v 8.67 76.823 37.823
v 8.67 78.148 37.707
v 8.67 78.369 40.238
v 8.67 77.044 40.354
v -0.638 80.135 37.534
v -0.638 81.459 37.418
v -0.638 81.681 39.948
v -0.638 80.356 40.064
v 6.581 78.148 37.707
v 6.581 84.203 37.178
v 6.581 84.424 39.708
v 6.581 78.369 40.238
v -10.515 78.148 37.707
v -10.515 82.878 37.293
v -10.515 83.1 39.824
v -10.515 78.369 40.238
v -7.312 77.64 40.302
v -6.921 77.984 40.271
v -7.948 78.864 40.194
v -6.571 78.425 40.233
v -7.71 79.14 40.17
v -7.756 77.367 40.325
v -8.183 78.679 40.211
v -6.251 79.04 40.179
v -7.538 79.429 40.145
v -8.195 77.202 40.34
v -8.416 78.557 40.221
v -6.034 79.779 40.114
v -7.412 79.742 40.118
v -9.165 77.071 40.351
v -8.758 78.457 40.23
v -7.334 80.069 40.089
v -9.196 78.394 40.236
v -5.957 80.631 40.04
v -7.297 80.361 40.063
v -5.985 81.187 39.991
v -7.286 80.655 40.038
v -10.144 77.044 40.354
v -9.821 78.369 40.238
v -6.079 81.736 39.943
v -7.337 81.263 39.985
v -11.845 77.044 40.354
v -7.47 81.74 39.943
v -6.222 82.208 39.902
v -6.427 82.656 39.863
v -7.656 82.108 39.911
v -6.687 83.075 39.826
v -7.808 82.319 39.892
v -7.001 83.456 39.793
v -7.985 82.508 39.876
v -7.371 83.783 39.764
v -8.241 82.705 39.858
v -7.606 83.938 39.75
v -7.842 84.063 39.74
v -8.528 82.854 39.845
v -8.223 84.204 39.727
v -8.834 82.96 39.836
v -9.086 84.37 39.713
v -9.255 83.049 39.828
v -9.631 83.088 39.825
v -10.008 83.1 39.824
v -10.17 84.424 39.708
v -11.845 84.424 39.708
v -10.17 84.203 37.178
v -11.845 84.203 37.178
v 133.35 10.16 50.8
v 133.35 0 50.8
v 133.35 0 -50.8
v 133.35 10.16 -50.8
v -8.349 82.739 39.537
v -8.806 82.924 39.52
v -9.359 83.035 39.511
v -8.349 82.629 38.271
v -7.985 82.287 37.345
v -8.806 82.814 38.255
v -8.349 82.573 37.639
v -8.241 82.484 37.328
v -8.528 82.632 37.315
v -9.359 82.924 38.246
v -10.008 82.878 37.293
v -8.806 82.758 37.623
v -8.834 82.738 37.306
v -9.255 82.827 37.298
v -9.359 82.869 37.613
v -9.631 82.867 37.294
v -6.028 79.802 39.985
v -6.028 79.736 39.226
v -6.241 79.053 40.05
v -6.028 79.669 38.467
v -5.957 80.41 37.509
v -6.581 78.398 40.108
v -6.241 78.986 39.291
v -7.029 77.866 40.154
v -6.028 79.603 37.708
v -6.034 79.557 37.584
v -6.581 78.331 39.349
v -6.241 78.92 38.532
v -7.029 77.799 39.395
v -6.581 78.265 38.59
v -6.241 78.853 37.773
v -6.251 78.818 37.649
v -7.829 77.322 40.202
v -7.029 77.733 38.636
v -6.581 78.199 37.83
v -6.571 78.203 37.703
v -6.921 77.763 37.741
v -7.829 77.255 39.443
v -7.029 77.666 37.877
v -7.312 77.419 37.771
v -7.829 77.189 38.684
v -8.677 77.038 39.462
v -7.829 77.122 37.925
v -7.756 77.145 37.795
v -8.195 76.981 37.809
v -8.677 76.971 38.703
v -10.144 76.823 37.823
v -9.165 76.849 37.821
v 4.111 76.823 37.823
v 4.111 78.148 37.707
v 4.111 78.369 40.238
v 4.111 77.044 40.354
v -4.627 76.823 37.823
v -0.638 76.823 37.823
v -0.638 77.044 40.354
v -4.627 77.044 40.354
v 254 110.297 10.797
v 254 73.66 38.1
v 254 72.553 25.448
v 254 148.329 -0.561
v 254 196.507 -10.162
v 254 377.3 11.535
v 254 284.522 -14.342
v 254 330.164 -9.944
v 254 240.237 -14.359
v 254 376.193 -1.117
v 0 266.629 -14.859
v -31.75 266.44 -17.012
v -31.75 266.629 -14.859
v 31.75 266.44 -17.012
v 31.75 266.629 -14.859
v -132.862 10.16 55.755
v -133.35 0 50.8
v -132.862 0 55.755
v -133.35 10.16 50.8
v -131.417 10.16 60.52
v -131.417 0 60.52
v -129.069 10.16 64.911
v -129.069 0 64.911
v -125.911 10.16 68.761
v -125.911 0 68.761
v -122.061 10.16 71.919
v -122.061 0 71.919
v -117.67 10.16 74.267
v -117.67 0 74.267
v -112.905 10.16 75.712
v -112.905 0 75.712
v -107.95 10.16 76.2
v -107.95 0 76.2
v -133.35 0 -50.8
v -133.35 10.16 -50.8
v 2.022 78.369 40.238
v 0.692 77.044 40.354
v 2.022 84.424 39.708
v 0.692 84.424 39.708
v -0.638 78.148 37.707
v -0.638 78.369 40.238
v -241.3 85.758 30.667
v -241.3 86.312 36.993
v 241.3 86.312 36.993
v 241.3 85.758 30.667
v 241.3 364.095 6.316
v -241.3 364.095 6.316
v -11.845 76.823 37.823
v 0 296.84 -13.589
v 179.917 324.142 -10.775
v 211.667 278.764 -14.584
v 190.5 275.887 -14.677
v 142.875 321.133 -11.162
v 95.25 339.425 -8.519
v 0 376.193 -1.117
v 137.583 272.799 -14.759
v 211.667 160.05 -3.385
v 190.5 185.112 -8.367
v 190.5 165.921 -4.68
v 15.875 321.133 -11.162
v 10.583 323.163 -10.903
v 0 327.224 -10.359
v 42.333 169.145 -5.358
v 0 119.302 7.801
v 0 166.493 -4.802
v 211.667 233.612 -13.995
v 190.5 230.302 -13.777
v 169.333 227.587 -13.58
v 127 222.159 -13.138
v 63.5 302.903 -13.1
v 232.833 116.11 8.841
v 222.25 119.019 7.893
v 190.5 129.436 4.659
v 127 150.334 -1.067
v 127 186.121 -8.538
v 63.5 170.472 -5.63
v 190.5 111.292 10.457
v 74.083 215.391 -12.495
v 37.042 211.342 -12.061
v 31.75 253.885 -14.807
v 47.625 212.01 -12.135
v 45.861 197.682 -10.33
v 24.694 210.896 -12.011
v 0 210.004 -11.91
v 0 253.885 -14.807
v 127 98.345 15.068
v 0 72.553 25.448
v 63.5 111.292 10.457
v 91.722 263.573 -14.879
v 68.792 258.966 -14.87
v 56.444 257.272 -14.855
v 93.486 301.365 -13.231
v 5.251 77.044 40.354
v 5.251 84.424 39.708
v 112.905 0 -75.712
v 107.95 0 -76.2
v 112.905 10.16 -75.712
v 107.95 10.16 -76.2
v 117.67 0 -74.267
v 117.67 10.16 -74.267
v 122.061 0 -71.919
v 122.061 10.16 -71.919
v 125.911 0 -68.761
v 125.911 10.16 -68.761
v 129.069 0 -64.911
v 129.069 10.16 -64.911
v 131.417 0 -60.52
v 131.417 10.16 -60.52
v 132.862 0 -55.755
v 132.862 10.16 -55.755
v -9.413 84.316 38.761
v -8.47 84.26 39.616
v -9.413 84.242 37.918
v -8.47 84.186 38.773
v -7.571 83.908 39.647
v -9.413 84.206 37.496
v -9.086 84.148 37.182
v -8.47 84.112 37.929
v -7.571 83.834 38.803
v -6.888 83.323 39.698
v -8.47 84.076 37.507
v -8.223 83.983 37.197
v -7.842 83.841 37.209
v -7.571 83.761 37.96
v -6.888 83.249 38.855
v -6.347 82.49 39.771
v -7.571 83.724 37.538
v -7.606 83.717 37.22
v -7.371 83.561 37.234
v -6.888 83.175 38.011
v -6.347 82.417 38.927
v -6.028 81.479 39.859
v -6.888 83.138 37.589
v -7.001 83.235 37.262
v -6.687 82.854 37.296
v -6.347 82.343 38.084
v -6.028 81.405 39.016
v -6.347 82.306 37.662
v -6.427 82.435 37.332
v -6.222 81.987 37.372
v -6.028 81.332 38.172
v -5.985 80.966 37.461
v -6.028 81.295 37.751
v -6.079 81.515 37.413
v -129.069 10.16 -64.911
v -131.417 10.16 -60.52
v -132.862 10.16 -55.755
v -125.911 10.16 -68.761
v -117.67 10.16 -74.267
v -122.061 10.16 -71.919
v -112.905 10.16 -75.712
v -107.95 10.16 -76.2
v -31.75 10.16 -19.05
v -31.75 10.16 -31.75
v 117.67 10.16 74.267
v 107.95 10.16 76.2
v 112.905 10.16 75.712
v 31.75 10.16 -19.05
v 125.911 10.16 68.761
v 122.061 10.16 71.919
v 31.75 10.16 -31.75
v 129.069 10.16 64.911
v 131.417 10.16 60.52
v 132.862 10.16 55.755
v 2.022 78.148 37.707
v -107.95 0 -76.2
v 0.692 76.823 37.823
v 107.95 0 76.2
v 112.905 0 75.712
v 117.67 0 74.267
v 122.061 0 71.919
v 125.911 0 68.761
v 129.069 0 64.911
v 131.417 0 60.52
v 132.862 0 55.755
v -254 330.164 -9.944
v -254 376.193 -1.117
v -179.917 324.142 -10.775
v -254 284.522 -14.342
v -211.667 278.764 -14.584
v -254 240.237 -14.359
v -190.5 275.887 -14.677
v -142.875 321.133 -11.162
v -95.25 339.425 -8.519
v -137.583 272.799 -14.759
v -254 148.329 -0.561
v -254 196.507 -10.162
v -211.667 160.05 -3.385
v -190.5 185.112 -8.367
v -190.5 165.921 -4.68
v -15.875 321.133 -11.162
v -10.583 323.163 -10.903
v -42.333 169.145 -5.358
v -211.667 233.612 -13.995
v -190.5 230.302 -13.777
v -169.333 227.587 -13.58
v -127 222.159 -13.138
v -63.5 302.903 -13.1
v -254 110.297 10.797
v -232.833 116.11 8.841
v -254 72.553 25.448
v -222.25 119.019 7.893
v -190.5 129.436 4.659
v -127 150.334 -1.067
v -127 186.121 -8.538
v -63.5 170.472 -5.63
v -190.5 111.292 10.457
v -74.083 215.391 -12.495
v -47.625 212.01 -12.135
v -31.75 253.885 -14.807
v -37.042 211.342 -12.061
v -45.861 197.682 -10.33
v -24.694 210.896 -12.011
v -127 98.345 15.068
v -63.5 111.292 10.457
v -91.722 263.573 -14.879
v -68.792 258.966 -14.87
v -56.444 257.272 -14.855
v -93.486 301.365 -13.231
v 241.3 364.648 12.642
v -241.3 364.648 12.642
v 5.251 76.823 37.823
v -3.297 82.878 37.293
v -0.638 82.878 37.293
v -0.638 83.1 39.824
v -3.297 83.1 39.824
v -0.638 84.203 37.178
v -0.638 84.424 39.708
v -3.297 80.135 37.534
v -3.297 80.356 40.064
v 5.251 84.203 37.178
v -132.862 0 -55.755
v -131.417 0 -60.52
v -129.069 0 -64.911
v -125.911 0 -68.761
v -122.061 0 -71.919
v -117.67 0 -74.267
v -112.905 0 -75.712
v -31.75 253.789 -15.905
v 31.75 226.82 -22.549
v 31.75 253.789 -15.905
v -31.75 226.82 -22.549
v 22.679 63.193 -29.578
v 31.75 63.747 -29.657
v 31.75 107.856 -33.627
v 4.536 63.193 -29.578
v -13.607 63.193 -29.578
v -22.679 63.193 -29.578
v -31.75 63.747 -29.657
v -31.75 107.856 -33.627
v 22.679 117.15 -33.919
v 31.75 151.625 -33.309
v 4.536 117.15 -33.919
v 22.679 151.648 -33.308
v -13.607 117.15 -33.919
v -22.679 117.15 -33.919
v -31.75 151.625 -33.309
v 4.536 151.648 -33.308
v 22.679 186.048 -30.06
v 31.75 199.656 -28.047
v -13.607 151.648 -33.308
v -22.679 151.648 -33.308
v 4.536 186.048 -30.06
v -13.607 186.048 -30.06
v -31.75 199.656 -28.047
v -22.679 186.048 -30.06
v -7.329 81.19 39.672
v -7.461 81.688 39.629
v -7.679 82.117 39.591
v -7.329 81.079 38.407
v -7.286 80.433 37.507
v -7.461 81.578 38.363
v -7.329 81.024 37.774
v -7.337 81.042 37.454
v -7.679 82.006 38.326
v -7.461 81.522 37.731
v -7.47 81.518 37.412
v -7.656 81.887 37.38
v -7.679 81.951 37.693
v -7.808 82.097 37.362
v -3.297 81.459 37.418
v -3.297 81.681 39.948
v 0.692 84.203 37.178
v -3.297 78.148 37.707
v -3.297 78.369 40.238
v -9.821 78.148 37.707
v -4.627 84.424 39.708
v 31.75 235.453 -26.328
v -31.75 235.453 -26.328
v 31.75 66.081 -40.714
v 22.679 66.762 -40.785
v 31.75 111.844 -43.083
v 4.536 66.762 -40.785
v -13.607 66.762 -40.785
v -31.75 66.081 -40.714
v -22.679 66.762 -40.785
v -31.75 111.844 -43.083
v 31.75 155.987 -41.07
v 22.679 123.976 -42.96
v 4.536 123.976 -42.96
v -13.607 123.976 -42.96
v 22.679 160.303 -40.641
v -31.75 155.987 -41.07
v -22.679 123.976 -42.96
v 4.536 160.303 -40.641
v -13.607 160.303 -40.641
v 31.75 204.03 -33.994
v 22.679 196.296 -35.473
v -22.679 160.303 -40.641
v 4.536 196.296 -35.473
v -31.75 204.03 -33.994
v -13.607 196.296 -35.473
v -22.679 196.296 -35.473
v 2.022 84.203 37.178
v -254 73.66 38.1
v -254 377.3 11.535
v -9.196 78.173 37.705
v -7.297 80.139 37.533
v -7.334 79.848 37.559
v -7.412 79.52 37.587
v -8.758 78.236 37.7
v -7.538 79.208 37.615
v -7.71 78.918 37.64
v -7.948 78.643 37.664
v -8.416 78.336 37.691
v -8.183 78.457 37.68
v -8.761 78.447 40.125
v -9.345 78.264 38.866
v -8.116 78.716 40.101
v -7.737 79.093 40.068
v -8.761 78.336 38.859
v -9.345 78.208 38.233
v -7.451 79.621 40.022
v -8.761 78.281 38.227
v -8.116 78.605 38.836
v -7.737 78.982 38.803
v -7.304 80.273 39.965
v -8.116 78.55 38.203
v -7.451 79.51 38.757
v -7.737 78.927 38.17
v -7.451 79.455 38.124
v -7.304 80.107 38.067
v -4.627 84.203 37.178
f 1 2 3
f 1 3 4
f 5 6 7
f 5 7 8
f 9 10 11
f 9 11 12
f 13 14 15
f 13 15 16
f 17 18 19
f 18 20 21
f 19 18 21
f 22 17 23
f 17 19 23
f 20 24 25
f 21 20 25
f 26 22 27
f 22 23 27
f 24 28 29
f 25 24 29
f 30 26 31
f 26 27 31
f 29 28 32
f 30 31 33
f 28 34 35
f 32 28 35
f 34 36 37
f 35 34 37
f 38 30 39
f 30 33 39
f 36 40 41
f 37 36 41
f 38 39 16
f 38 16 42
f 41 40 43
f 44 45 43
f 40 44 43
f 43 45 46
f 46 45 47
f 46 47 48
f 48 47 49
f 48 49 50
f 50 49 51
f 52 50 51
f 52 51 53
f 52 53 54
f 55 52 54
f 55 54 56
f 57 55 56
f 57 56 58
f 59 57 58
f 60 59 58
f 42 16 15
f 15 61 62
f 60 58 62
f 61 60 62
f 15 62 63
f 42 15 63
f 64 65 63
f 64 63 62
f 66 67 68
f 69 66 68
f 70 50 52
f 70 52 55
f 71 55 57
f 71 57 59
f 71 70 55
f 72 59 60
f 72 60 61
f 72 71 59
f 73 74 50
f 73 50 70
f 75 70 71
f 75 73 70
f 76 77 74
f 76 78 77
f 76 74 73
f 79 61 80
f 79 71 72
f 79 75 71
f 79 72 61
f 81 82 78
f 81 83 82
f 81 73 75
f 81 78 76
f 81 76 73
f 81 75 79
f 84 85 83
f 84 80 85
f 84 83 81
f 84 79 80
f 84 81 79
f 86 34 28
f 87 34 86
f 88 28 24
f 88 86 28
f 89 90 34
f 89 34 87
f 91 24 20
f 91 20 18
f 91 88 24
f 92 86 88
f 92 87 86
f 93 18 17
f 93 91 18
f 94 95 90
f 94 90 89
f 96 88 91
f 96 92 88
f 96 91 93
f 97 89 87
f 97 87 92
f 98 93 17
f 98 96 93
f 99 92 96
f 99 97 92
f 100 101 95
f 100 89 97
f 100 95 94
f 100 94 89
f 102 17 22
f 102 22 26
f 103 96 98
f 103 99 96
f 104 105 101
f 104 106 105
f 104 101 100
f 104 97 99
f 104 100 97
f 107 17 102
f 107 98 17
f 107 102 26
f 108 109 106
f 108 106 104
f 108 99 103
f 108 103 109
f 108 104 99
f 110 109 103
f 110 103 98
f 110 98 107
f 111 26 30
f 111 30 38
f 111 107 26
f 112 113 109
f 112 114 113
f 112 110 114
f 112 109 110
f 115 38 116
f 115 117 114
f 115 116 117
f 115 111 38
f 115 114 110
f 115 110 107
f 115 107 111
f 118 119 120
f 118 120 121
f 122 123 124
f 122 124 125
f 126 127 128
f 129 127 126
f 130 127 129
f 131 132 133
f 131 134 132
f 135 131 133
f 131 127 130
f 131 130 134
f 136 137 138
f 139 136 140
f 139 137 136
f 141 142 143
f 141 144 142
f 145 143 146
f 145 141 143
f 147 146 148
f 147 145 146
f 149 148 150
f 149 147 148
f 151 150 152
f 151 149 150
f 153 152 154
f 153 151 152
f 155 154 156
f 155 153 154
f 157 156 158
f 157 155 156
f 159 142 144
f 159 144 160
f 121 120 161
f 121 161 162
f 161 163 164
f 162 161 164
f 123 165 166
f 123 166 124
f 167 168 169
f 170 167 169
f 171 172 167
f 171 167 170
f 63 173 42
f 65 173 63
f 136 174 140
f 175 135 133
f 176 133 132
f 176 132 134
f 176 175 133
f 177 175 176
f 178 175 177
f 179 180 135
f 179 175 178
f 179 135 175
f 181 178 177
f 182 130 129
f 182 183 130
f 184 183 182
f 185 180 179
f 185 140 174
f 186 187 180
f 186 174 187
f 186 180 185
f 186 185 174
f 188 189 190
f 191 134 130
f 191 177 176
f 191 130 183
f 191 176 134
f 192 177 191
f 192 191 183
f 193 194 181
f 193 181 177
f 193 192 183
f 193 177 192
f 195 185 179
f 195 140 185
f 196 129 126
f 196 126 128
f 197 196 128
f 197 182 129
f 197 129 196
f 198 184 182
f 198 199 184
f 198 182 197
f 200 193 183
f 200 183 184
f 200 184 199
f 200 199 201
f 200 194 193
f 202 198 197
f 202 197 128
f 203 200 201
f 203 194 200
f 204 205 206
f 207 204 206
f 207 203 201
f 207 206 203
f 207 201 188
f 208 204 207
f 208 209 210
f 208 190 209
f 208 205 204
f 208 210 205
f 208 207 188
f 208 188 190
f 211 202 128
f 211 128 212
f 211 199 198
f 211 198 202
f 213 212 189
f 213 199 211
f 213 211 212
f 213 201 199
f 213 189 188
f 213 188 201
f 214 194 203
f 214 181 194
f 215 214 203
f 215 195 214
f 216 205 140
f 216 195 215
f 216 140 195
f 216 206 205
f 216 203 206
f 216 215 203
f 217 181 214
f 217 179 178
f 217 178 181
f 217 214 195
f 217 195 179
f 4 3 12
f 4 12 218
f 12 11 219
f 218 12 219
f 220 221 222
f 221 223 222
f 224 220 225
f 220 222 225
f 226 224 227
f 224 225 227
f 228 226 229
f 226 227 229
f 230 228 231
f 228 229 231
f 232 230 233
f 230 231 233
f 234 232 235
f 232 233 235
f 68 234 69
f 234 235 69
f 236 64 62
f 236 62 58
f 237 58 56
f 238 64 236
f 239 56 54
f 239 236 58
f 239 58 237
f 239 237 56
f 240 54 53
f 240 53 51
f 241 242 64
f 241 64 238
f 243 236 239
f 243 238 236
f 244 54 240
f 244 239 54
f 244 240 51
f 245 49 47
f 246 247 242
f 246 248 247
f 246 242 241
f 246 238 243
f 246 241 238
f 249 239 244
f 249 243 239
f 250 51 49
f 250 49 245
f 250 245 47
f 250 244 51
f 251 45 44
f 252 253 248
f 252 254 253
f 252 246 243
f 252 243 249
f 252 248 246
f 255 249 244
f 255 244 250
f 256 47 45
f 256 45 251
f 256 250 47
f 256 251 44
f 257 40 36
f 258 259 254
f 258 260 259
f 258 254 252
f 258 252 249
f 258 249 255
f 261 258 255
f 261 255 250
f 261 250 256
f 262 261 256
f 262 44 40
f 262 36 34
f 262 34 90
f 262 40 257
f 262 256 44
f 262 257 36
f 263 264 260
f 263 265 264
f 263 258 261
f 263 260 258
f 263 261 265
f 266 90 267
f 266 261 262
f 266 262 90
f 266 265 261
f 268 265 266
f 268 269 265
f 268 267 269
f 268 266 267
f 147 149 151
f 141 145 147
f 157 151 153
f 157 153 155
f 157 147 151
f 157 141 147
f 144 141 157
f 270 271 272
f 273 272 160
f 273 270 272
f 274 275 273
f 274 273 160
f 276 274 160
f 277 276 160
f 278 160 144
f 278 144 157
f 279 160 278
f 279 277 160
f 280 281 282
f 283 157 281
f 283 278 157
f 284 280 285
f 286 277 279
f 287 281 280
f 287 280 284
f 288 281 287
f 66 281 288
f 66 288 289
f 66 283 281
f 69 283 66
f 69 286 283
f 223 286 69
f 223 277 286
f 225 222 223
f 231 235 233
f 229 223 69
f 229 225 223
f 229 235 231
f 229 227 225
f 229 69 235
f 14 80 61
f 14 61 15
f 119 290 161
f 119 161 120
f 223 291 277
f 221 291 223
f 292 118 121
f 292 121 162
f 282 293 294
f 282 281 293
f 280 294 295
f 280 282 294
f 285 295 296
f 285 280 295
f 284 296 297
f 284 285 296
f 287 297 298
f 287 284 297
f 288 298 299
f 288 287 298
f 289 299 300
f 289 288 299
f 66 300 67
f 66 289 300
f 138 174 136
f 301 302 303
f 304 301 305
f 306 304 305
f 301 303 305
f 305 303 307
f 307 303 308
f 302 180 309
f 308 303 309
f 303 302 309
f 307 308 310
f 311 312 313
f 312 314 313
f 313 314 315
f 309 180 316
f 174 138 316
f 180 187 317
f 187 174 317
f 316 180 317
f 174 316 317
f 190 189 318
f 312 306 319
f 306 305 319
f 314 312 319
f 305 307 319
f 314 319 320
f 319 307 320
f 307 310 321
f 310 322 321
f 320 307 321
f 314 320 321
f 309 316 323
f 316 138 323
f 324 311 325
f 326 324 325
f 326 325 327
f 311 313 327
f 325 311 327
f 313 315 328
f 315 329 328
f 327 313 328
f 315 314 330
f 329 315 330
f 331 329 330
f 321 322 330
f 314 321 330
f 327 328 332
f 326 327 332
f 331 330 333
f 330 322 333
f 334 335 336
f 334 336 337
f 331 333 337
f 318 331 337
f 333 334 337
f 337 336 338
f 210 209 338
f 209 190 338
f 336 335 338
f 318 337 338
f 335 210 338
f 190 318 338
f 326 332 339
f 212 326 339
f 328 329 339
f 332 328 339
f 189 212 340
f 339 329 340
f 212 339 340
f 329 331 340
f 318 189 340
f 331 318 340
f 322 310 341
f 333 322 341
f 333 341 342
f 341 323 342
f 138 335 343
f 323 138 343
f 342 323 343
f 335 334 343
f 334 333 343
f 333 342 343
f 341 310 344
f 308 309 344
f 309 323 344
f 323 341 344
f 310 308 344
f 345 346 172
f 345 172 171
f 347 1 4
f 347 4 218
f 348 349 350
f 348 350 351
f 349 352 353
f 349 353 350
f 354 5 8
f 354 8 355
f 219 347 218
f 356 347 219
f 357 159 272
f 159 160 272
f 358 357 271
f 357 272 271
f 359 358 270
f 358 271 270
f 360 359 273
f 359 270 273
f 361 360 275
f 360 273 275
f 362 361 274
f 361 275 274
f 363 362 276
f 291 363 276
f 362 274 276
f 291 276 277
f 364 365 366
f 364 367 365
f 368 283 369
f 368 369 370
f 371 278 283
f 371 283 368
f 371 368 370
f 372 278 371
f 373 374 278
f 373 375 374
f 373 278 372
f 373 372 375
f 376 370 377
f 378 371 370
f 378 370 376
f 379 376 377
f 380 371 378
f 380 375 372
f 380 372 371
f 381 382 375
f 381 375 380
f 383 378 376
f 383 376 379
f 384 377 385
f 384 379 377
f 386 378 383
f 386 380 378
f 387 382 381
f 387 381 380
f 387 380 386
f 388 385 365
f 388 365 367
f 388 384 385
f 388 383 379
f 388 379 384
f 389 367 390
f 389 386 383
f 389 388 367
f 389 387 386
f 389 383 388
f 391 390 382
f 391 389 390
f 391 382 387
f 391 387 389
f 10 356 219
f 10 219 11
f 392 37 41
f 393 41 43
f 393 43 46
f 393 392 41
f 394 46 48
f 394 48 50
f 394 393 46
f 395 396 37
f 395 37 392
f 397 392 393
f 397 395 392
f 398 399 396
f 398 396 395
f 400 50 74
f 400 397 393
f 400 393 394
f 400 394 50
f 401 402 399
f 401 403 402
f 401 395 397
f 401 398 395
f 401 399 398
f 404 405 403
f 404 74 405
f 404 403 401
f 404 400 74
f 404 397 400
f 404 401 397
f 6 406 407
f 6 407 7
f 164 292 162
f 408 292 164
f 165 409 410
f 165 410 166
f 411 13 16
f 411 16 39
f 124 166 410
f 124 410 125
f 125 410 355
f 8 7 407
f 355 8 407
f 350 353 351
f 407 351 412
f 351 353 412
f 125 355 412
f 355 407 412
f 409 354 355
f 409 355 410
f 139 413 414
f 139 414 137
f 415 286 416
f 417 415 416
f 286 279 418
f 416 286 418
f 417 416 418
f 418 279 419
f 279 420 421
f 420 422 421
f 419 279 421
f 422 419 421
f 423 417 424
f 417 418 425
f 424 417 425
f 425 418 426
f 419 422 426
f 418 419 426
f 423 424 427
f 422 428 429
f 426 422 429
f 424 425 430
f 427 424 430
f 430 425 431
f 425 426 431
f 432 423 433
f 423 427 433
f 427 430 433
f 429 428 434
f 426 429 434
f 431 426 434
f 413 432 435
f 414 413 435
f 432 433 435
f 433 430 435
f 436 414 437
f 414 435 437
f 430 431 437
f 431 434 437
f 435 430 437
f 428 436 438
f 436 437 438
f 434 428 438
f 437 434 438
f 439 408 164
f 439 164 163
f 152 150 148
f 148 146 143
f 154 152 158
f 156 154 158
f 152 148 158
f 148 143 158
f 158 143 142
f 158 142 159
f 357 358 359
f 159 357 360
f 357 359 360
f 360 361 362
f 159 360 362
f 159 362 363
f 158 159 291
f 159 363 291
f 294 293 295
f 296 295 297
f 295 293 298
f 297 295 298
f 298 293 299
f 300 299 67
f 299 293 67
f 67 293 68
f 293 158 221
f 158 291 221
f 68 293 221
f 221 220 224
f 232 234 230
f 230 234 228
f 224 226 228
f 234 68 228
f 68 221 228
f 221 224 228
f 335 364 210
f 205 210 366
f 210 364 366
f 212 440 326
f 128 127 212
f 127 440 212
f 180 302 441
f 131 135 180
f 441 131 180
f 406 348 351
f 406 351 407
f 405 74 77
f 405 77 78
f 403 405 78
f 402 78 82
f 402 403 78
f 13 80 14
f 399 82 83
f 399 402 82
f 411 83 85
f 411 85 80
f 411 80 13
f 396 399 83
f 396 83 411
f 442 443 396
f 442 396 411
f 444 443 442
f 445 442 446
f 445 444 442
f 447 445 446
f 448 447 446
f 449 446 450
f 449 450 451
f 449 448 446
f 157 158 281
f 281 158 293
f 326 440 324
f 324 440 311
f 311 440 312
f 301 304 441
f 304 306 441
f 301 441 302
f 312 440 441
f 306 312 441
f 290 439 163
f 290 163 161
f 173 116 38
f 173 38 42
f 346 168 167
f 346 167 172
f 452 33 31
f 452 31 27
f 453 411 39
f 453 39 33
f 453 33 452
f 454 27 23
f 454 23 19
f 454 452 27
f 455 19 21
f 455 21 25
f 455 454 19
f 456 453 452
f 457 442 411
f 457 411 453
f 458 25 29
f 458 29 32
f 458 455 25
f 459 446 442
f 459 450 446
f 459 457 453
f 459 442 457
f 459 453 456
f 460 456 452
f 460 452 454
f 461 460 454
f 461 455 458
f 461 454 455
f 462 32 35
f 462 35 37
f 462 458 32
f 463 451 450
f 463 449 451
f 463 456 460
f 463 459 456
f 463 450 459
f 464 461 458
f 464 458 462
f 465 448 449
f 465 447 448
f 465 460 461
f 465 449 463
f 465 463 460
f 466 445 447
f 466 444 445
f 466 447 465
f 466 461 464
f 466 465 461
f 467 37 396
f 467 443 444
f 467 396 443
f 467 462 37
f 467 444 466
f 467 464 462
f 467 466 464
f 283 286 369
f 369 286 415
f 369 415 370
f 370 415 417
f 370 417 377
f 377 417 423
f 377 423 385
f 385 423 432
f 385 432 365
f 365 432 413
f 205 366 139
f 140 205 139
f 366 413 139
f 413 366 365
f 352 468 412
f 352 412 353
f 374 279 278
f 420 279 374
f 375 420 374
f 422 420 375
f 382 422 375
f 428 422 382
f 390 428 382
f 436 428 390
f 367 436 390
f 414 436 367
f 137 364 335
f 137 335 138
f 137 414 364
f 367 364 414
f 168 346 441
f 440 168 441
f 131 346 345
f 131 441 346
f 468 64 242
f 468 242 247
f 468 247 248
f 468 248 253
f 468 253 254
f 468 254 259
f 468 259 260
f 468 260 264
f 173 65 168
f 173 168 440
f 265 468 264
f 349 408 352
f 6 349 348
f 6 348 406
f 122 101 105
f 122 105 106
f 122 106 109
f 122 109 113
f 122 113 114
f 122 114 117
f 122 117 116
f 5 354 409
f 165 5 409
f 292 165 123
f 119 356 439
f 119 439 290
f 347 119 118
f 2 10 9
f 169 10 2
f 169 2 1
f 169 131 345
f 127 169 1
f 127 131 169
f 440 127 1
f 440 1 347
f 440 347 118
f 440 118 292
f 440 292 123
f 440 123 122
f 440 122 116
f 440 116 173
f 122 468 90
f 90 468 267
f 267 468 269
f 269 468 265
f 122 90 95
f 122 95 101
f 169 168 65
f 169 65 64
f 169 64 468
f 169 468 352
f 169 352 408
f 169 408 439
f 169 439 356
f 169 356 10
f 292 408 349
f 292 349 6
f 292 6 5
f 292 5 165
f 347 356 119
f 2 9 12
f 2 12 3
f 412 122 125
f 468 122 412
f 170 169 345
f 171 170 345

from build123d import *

# Parameters (mm, degrees)
SKETCH1_W           = 266.7
SKETCH1_H           = 152.4
BOSS_EXTRUDE1_DEPTH = 10.16
BOSS_EXTRUDE3_DEPTH = 254
SKETCH6_W           = 482.6
SKETCH6_H           = 279.4
CUT_EXTRUDE1_DEPTH  = 6.35
LOFT1_START         = -31.75
LOFT1_DEPTH         = 63.5
BOSS_EXTRUDE4_REACH = 463.798
SKETCH7_2_W         = 63.5
SKETCH7_2_H         = 12.7
FILLET4_R           = 25.4
BOSS_EXTRUDE5_DEPTH = 2.54


# Read off the part's stored shape, not the designer's step: Loft1
with BuildPart() as part:
    # Sketch1 → Boss-Extrude1 (new body)
    with BuildSketch(Plane(origin=(0, 0, 0), x_dir=(1, 0, 0), z_dir=(0, 1, 0))):
        Rectangle(SKETCH1_W, SKETCH1_H)
    extrude(amount=BOSS_EXTRUDE1_DEPTH)

    # Loft1 outline → Loft1 (add)
    with BuildSketch(Plane.YZ.offset(LOFT1_START)):
        with BuildLine():
            Line((10.16, -19.05), (10.16, -31.75))
            add(Edge.make_bspline(
                [(10.16, -31.75), (28.965309161, -35.285855321), (52.902221104, -39.786576725), (90.992153833, -42.855395332), (120.526662629, -43.520710588), (158.632305833, -41.305063295), (187.826991891, -37.239656645), (225.166907406, -29.818418758), (248.281057243, -22.646287688), (266.440292521, -17.011625957)],
                knots=[0, 0, 0, 0, 0.219947035, 0.279966299, 0.439970653, 0.559991905, 0.720003625, 0.780025652, 1, 1, 1, 1], degree=3))
            Line((266.440292521, -17.011625957), (253.788619855, -15.904748024))
            add(Edge.make_bspline(
                [(10.16, -19.05), (27.75631541, -23.030622259), (50.154322743, -28.097478842), (85.975275474, -32.459987698), (113.853351235, -34.286596432), (150.017339583, -33.849624359), (177.910203308, -31.332603381), (213.761877453, -26.061191443), (236.17787553, -20.373323721), (253.788619855, -15.904748024)],
                knots=[0, 0, 0, 0, 0.219947035, 0.279966299, 0.439970653, 0.559991905, 0.720003625, 0.780025652, 1, 1, 1, 1], degree=3))
        make_face()
    extrude(amount=LOFT1_DEPTH)


with BuildPart() as body_2:
    # Sketch5 → Boss-Extrude3 (new, symmetric)
    with BuildSketch(Plane(origin=(0, 0, 0), x_dir=(0, 0, -1), z_dir=(1, 0, 0))):
        with BuildLine():
            Line((-38.1, 73.66), (-25.448327334, 72.553122067))
            add(Edge.make_bspline(
                [(1.116743055, 376.193266045), (38.440898524, 219.945682325), (-25.448327334, 72.553122067)],
                knots=[0, 0, 0, 1, 1, 1], degree=2))
            Line((1.116743055, 376.193266045), (-11.534929611, 377.300143978))
            Line((-11.534929611, 377.300143978), (-38.1, 73.66))
        make_face()
    extrude(amount=BOSS_EXTRUDE3_DEPTH, both=True)

    # Sketch6 → Cut-Extrude1 (cut)
    with BuildSketch(Plane(origin=(0, 3.867528241, 44.206050078), x_dir=(1, 0, 0), z_dir=(0, 0.08715574274765818, 0.9961946980917455))):
        with Locations((0, 222.459067663)):
            Rectangle(SKETCH6_W, SKETCH6_H)
    extrude(amount=-CUT_EXTRUDE1_DEPTH, mode=Mode.SUBTRACT)

    # Sketch7<2> → Boss-Extrude4 (add, up to next)
    with BuildSketch(Plane(origin=(0, 0.546894442, 6.251032081), x_dir=(1, 0, 0), z_dir=(0, 0.08715574274765883, 0.9961946980917455)), mode=Mode.PRIVATE) as boss_extrude4_sk1:
        with Locations((0, 260.559067663)):
            Rectangle(SKETCH7_2_W, SKETCH7_2_H)
    boss_extrude4_tool1 = extrude(boss_extrude4_sk1.sketch, amount=BOSS_EXTRUDE4_REACH, mode=Mode.PRIVATE) - body_2.part

    add(part.part)  # Boss-Extrude4 merges part
    add(boss_extrude4_tool1.solids().sort_by_distance((0, 260.114456, -16.458187))[0])

    # Fillet4
    fillet4_edges = [body_2.edges().sort_by_distance(p)[0] for p in [
        (133.35, 5.08, 76.2),
        (133.35, 5.08, -76.2),
        (-133.35, 5.08, -76.2),
        (-133.35, 5.08, 76.2),
    ]]
    fillet(fillet4_edges, radius=FILLET4_R)

    # Sketch9 → Boss-Extrude5 (add)
    # profile 1 of 4: a face of its own
    with BuildSketch(Plane(origin=(0, 3.867528241, 44.206050078), x_dir=(1, 0, 0), z_dir=(0, 0.08715574274765818, 0.9961946980917455))):
        with BuildLine():
            Line((-11.845192308, 80.642400996), (-10.169709869, 80.642400996))
            add(Edge.make_bspline(
                [(-10.169709869, 80.642400996), (-10.039086742, 80.641487896), (-9.786590759, 80.639722862), (-9.420774033, 80.619835181), (-9.080611029, 80.58924934), (-8.76588247, 80.547172972), (-8.477233602, 80.491494415), (-8.215036632, 80.421656578), (-7.978411563, 80.341040413), (-7.76476385, 80.246179137), (-7.569724038, 80.13558031), (-7.384527512, 80.012382096), (-7.2095379, 79.872071384), (-7.042299501, 79.717355048), (-6.884970561, 79.545402599), (-6.73493099, 79.359062194), (-6.595854438, 79.155631639), (-6.46353692, 78.939988558), (-6.343873333, 78.711219076), (-6.23949828, 78.47127043), (-6.152062666, 78.221686781), (-6.081016701, 77.962202136), (-6.024384868, 77.693677905), (-5.984760716, 77.415572233), (-5.96026467, 77.128142598), (-5.957779751, 76.933337422), (-5.956517094, 76.83435145)],
                knots=[0, 0, 0, 0, 1.44355588, 2.790409838, 4.047694926, 5.217575253, 6.298404546, 7.294384826, 8.214239204, 9.058592145, 9.873746385, 10.689560431, 11.514393297, 12.350027578, 13.205127629, 14.088021785, 14.991911688, 15.926770944, 16.882954281, 17.842803888, 18.816321264, 19.80318086, 20.814351908, 21.847355356, 22.906180909, 24, 24, 24, 24], degree=3))
            add(Edge.make_bspline(
                [(-5.956517094, 76.83435145), (-5.959823412, 76.694675801), (-5.966332092, 76.419716111), (-6.021157576, 76.016215932), (-6.109828948, 75.629420767), (-6.23450895, 75.262356277), (-6.389078777, 74.918291224), (-6.573729744, 74.603293052), (-6.785754438, 74.319052512), (-7.022682758, 74.066984889), (-7.279218425, 73.85032935), (-7.545810714, 73.664779736), (-7.825056719, 73.518458383), (-8.071111475, 73.425668764), (-8.284471646, 73.367961649), (-8.471799567, 73.333856188), (-8.684584973, 73.302579424), (-8.924811901, 73.278409413), (-9.191426528, 73.256855703), (-9.485491584, 73.245144256), (-9.80605497, 73.235413782), (-10.028716551, 73.234528126), (-10.14448117, 73.234067663)],
                knots=[0, 0, 0, 0, 1.315458931, 2.589557908, 3.828601765, 5.048913369, 6.235739168, 7.376350998, 8.481830359, 9.569842114, 10.627874879, 11.640079404, 12.624025415, 13.590060155, 14.111227486, 14.704434459, 15.382649715, 16.137166398, 16.978595427, 17.902333227, 18.909396075, 20, 20, 20, 20], degree=3))
            Line((-10.14448117, 73.234067663), (-11.845192308, 73.234067663))
            Line((-11.845192308, 73.234067663), (-11.845192308, 80.642400996))
        make_face()
        with BuildLine():
            Line((-10.515491453, 79.312700141), (-10.515491453, 74.563768517))
            Line((-10.515491453, 74.563768517), (-9.820960203, 74.563768517))
            add(Edge.make_bspline(
                [(-9.820960203, 74.563768517), (-9.738321651, 74.563919946), (-9.579380204, 74.564211192), (-9.349904733, 74.578083516), (-9.137698107, 74.592007503), (-8.943344483, 74.618435698), (-8.765429413, 74.647874846), (-8.606396987, 74.688843453), (-8.462968854, 74.731877503), (-8.336896961, 74.786665183), (-8.221425379, 74.848332363), (-8.114511884, 74.920582613), (-8.011310428, 75.000813792), (-7.913750445, 75.091385611), (-7.821462695, 75.19109873), (-7.734993209, 75.300466927), (-7.65318785, 75.419156515), (-7.578146405, 75.547795036), (-7.509573132, 75.685024038), (-7.448740954, 75.829514259), (-7.398302102, 75.982468991), (-7.356380416, 76.142456392), (-7.326422619, 76.310869336), (-7.301638255, 76.486460411), (-7.288861193, 76.669925294), (-7.287107621, 76.794760931), (-7.286217949, 76.858096108)],
                knots=[0, 0, 0, 0, 1.50275155, 2.890291501, 4.180787663, 5.369391935, 6.45668281, 7.458360028, 8.354766181, 9.177074746, 9.954075863, 10.732690366, 11.5210699, 12.329727389, 13.151100085, 13.990027547, 14.863562427, 15.770965086, 16.696477834, 17.652329173, 18.619756807, 19.62365428, 20.657822005, 21.729286259, 22.847956731, 24, 24, 24, 24], degree=3))
            add(Edge.make_bspline(
                [(-7.286217949, 76.858096108), (-7.287989874, 76.955151279), (-7.29144499, 77.144401343), (-7.324765386, 77.420048191), (-7.379004633, 77.679610993), (-7.456398814, 77.922126441), (-7.553956576, 78.14827613), (-7.676072858, 78.356144094), (-7.817492245, 78.549222228), (-7.929322837, 78.662488057), (-7.985201322, 78.719083688)],
                knots=[0, 0, 0, 0, 1.13821349, 2.219428113, 3.251817212, 4.244760574, 5.201143372, 6.134805572, 7.068016741, 8, 8, 8, 8], degree=3))
            add(Edge.make_bspline(
                [(-7.985201322, 78.719083688), (-8.0403028, 78.767310817), (-8.152841329, 78.865809267), (-8.350422003, 78.9838356), (-8.568145674, 79.087533301), (-8.810993205, 79.169754014), (-9.076617583, 79.234777659), (-9.366600873, 79.279622877), (-9.679390151, 79.308439938), (-9.896083274, 79.31124965), (-10.007949386, 79.312700141)],
                knots=[0, 0, 0, 0, 0.813307809, 1.661089106, 2.549956539, 3.493439533, 4.508053171, 5.589449661, 6.755572447, 8, 8, 8, 8], degree=3))
            Line((-10.007949386, 79.312700141), (-10.515491453, 79.312700141))
        make_face(mode=Mode.SUBTRACT)
    # profile 2 of 4: a face of its own
    with BuildSketch(Plane(origin=(0, 3.867528241, 44.206050078), x_dir=(1, 0, 0), z_dir=(0, 0.08715574274765818, 0.9961946980917455))):
        Polygon((-4.626816239, 80.642400996), (-0.637713675, 80.642400996), (-0.637713675, 79.312700141), (-3.297115385, 79.312700141), (-3.297115385, 77.888020654), (-0.637713675, 77.888020654), (-0.637713675, 76.5583198), (-3.297115385, 76.5583198), (-3.297115385, 74.563768517), (-0.637713675, 74.563768517), (-0.637713675, 73.234067663), (-4.626816239, 73.234067663), align=None)
    # profile 3 of 4: a face of its own
    with BuildSketch(Plane(origin=(0, 3.867528241, 44.206050078), x_dir=(1, 0, 0), z_dir=(0, 0.08715574274765818, 0.9961946980917455))):
        Polygon((0.691987179, 80.642400996), (2.021688034, 80.642400996), (2.021688034, 74.563768517), (4.111217949, 74.563768517), (4.111217949, 73.234067663), (0.691987179, 73.234067663), align=None)
    # profile 4 of 4: a face of its own
    with BuildSketch(Plane(origin=(0, 3.867528241, 44.206050078), x_dir=(1, 0, 0), z_dir=(0, 0.08715574274765818, 0.9961946980917455))):
        Polygon((5.250961538, 80.642400996), (6.580662393, 80.642400996), (6.580662393, 74.563768517), (8.670192308, 74.563768517), (8.670192308, 73.234067663), (5.250961538, 73.234067663), align=None)
    extrude(amount=BOSS_EXTRUDE5_DEPTH)


solid = body_2.part
